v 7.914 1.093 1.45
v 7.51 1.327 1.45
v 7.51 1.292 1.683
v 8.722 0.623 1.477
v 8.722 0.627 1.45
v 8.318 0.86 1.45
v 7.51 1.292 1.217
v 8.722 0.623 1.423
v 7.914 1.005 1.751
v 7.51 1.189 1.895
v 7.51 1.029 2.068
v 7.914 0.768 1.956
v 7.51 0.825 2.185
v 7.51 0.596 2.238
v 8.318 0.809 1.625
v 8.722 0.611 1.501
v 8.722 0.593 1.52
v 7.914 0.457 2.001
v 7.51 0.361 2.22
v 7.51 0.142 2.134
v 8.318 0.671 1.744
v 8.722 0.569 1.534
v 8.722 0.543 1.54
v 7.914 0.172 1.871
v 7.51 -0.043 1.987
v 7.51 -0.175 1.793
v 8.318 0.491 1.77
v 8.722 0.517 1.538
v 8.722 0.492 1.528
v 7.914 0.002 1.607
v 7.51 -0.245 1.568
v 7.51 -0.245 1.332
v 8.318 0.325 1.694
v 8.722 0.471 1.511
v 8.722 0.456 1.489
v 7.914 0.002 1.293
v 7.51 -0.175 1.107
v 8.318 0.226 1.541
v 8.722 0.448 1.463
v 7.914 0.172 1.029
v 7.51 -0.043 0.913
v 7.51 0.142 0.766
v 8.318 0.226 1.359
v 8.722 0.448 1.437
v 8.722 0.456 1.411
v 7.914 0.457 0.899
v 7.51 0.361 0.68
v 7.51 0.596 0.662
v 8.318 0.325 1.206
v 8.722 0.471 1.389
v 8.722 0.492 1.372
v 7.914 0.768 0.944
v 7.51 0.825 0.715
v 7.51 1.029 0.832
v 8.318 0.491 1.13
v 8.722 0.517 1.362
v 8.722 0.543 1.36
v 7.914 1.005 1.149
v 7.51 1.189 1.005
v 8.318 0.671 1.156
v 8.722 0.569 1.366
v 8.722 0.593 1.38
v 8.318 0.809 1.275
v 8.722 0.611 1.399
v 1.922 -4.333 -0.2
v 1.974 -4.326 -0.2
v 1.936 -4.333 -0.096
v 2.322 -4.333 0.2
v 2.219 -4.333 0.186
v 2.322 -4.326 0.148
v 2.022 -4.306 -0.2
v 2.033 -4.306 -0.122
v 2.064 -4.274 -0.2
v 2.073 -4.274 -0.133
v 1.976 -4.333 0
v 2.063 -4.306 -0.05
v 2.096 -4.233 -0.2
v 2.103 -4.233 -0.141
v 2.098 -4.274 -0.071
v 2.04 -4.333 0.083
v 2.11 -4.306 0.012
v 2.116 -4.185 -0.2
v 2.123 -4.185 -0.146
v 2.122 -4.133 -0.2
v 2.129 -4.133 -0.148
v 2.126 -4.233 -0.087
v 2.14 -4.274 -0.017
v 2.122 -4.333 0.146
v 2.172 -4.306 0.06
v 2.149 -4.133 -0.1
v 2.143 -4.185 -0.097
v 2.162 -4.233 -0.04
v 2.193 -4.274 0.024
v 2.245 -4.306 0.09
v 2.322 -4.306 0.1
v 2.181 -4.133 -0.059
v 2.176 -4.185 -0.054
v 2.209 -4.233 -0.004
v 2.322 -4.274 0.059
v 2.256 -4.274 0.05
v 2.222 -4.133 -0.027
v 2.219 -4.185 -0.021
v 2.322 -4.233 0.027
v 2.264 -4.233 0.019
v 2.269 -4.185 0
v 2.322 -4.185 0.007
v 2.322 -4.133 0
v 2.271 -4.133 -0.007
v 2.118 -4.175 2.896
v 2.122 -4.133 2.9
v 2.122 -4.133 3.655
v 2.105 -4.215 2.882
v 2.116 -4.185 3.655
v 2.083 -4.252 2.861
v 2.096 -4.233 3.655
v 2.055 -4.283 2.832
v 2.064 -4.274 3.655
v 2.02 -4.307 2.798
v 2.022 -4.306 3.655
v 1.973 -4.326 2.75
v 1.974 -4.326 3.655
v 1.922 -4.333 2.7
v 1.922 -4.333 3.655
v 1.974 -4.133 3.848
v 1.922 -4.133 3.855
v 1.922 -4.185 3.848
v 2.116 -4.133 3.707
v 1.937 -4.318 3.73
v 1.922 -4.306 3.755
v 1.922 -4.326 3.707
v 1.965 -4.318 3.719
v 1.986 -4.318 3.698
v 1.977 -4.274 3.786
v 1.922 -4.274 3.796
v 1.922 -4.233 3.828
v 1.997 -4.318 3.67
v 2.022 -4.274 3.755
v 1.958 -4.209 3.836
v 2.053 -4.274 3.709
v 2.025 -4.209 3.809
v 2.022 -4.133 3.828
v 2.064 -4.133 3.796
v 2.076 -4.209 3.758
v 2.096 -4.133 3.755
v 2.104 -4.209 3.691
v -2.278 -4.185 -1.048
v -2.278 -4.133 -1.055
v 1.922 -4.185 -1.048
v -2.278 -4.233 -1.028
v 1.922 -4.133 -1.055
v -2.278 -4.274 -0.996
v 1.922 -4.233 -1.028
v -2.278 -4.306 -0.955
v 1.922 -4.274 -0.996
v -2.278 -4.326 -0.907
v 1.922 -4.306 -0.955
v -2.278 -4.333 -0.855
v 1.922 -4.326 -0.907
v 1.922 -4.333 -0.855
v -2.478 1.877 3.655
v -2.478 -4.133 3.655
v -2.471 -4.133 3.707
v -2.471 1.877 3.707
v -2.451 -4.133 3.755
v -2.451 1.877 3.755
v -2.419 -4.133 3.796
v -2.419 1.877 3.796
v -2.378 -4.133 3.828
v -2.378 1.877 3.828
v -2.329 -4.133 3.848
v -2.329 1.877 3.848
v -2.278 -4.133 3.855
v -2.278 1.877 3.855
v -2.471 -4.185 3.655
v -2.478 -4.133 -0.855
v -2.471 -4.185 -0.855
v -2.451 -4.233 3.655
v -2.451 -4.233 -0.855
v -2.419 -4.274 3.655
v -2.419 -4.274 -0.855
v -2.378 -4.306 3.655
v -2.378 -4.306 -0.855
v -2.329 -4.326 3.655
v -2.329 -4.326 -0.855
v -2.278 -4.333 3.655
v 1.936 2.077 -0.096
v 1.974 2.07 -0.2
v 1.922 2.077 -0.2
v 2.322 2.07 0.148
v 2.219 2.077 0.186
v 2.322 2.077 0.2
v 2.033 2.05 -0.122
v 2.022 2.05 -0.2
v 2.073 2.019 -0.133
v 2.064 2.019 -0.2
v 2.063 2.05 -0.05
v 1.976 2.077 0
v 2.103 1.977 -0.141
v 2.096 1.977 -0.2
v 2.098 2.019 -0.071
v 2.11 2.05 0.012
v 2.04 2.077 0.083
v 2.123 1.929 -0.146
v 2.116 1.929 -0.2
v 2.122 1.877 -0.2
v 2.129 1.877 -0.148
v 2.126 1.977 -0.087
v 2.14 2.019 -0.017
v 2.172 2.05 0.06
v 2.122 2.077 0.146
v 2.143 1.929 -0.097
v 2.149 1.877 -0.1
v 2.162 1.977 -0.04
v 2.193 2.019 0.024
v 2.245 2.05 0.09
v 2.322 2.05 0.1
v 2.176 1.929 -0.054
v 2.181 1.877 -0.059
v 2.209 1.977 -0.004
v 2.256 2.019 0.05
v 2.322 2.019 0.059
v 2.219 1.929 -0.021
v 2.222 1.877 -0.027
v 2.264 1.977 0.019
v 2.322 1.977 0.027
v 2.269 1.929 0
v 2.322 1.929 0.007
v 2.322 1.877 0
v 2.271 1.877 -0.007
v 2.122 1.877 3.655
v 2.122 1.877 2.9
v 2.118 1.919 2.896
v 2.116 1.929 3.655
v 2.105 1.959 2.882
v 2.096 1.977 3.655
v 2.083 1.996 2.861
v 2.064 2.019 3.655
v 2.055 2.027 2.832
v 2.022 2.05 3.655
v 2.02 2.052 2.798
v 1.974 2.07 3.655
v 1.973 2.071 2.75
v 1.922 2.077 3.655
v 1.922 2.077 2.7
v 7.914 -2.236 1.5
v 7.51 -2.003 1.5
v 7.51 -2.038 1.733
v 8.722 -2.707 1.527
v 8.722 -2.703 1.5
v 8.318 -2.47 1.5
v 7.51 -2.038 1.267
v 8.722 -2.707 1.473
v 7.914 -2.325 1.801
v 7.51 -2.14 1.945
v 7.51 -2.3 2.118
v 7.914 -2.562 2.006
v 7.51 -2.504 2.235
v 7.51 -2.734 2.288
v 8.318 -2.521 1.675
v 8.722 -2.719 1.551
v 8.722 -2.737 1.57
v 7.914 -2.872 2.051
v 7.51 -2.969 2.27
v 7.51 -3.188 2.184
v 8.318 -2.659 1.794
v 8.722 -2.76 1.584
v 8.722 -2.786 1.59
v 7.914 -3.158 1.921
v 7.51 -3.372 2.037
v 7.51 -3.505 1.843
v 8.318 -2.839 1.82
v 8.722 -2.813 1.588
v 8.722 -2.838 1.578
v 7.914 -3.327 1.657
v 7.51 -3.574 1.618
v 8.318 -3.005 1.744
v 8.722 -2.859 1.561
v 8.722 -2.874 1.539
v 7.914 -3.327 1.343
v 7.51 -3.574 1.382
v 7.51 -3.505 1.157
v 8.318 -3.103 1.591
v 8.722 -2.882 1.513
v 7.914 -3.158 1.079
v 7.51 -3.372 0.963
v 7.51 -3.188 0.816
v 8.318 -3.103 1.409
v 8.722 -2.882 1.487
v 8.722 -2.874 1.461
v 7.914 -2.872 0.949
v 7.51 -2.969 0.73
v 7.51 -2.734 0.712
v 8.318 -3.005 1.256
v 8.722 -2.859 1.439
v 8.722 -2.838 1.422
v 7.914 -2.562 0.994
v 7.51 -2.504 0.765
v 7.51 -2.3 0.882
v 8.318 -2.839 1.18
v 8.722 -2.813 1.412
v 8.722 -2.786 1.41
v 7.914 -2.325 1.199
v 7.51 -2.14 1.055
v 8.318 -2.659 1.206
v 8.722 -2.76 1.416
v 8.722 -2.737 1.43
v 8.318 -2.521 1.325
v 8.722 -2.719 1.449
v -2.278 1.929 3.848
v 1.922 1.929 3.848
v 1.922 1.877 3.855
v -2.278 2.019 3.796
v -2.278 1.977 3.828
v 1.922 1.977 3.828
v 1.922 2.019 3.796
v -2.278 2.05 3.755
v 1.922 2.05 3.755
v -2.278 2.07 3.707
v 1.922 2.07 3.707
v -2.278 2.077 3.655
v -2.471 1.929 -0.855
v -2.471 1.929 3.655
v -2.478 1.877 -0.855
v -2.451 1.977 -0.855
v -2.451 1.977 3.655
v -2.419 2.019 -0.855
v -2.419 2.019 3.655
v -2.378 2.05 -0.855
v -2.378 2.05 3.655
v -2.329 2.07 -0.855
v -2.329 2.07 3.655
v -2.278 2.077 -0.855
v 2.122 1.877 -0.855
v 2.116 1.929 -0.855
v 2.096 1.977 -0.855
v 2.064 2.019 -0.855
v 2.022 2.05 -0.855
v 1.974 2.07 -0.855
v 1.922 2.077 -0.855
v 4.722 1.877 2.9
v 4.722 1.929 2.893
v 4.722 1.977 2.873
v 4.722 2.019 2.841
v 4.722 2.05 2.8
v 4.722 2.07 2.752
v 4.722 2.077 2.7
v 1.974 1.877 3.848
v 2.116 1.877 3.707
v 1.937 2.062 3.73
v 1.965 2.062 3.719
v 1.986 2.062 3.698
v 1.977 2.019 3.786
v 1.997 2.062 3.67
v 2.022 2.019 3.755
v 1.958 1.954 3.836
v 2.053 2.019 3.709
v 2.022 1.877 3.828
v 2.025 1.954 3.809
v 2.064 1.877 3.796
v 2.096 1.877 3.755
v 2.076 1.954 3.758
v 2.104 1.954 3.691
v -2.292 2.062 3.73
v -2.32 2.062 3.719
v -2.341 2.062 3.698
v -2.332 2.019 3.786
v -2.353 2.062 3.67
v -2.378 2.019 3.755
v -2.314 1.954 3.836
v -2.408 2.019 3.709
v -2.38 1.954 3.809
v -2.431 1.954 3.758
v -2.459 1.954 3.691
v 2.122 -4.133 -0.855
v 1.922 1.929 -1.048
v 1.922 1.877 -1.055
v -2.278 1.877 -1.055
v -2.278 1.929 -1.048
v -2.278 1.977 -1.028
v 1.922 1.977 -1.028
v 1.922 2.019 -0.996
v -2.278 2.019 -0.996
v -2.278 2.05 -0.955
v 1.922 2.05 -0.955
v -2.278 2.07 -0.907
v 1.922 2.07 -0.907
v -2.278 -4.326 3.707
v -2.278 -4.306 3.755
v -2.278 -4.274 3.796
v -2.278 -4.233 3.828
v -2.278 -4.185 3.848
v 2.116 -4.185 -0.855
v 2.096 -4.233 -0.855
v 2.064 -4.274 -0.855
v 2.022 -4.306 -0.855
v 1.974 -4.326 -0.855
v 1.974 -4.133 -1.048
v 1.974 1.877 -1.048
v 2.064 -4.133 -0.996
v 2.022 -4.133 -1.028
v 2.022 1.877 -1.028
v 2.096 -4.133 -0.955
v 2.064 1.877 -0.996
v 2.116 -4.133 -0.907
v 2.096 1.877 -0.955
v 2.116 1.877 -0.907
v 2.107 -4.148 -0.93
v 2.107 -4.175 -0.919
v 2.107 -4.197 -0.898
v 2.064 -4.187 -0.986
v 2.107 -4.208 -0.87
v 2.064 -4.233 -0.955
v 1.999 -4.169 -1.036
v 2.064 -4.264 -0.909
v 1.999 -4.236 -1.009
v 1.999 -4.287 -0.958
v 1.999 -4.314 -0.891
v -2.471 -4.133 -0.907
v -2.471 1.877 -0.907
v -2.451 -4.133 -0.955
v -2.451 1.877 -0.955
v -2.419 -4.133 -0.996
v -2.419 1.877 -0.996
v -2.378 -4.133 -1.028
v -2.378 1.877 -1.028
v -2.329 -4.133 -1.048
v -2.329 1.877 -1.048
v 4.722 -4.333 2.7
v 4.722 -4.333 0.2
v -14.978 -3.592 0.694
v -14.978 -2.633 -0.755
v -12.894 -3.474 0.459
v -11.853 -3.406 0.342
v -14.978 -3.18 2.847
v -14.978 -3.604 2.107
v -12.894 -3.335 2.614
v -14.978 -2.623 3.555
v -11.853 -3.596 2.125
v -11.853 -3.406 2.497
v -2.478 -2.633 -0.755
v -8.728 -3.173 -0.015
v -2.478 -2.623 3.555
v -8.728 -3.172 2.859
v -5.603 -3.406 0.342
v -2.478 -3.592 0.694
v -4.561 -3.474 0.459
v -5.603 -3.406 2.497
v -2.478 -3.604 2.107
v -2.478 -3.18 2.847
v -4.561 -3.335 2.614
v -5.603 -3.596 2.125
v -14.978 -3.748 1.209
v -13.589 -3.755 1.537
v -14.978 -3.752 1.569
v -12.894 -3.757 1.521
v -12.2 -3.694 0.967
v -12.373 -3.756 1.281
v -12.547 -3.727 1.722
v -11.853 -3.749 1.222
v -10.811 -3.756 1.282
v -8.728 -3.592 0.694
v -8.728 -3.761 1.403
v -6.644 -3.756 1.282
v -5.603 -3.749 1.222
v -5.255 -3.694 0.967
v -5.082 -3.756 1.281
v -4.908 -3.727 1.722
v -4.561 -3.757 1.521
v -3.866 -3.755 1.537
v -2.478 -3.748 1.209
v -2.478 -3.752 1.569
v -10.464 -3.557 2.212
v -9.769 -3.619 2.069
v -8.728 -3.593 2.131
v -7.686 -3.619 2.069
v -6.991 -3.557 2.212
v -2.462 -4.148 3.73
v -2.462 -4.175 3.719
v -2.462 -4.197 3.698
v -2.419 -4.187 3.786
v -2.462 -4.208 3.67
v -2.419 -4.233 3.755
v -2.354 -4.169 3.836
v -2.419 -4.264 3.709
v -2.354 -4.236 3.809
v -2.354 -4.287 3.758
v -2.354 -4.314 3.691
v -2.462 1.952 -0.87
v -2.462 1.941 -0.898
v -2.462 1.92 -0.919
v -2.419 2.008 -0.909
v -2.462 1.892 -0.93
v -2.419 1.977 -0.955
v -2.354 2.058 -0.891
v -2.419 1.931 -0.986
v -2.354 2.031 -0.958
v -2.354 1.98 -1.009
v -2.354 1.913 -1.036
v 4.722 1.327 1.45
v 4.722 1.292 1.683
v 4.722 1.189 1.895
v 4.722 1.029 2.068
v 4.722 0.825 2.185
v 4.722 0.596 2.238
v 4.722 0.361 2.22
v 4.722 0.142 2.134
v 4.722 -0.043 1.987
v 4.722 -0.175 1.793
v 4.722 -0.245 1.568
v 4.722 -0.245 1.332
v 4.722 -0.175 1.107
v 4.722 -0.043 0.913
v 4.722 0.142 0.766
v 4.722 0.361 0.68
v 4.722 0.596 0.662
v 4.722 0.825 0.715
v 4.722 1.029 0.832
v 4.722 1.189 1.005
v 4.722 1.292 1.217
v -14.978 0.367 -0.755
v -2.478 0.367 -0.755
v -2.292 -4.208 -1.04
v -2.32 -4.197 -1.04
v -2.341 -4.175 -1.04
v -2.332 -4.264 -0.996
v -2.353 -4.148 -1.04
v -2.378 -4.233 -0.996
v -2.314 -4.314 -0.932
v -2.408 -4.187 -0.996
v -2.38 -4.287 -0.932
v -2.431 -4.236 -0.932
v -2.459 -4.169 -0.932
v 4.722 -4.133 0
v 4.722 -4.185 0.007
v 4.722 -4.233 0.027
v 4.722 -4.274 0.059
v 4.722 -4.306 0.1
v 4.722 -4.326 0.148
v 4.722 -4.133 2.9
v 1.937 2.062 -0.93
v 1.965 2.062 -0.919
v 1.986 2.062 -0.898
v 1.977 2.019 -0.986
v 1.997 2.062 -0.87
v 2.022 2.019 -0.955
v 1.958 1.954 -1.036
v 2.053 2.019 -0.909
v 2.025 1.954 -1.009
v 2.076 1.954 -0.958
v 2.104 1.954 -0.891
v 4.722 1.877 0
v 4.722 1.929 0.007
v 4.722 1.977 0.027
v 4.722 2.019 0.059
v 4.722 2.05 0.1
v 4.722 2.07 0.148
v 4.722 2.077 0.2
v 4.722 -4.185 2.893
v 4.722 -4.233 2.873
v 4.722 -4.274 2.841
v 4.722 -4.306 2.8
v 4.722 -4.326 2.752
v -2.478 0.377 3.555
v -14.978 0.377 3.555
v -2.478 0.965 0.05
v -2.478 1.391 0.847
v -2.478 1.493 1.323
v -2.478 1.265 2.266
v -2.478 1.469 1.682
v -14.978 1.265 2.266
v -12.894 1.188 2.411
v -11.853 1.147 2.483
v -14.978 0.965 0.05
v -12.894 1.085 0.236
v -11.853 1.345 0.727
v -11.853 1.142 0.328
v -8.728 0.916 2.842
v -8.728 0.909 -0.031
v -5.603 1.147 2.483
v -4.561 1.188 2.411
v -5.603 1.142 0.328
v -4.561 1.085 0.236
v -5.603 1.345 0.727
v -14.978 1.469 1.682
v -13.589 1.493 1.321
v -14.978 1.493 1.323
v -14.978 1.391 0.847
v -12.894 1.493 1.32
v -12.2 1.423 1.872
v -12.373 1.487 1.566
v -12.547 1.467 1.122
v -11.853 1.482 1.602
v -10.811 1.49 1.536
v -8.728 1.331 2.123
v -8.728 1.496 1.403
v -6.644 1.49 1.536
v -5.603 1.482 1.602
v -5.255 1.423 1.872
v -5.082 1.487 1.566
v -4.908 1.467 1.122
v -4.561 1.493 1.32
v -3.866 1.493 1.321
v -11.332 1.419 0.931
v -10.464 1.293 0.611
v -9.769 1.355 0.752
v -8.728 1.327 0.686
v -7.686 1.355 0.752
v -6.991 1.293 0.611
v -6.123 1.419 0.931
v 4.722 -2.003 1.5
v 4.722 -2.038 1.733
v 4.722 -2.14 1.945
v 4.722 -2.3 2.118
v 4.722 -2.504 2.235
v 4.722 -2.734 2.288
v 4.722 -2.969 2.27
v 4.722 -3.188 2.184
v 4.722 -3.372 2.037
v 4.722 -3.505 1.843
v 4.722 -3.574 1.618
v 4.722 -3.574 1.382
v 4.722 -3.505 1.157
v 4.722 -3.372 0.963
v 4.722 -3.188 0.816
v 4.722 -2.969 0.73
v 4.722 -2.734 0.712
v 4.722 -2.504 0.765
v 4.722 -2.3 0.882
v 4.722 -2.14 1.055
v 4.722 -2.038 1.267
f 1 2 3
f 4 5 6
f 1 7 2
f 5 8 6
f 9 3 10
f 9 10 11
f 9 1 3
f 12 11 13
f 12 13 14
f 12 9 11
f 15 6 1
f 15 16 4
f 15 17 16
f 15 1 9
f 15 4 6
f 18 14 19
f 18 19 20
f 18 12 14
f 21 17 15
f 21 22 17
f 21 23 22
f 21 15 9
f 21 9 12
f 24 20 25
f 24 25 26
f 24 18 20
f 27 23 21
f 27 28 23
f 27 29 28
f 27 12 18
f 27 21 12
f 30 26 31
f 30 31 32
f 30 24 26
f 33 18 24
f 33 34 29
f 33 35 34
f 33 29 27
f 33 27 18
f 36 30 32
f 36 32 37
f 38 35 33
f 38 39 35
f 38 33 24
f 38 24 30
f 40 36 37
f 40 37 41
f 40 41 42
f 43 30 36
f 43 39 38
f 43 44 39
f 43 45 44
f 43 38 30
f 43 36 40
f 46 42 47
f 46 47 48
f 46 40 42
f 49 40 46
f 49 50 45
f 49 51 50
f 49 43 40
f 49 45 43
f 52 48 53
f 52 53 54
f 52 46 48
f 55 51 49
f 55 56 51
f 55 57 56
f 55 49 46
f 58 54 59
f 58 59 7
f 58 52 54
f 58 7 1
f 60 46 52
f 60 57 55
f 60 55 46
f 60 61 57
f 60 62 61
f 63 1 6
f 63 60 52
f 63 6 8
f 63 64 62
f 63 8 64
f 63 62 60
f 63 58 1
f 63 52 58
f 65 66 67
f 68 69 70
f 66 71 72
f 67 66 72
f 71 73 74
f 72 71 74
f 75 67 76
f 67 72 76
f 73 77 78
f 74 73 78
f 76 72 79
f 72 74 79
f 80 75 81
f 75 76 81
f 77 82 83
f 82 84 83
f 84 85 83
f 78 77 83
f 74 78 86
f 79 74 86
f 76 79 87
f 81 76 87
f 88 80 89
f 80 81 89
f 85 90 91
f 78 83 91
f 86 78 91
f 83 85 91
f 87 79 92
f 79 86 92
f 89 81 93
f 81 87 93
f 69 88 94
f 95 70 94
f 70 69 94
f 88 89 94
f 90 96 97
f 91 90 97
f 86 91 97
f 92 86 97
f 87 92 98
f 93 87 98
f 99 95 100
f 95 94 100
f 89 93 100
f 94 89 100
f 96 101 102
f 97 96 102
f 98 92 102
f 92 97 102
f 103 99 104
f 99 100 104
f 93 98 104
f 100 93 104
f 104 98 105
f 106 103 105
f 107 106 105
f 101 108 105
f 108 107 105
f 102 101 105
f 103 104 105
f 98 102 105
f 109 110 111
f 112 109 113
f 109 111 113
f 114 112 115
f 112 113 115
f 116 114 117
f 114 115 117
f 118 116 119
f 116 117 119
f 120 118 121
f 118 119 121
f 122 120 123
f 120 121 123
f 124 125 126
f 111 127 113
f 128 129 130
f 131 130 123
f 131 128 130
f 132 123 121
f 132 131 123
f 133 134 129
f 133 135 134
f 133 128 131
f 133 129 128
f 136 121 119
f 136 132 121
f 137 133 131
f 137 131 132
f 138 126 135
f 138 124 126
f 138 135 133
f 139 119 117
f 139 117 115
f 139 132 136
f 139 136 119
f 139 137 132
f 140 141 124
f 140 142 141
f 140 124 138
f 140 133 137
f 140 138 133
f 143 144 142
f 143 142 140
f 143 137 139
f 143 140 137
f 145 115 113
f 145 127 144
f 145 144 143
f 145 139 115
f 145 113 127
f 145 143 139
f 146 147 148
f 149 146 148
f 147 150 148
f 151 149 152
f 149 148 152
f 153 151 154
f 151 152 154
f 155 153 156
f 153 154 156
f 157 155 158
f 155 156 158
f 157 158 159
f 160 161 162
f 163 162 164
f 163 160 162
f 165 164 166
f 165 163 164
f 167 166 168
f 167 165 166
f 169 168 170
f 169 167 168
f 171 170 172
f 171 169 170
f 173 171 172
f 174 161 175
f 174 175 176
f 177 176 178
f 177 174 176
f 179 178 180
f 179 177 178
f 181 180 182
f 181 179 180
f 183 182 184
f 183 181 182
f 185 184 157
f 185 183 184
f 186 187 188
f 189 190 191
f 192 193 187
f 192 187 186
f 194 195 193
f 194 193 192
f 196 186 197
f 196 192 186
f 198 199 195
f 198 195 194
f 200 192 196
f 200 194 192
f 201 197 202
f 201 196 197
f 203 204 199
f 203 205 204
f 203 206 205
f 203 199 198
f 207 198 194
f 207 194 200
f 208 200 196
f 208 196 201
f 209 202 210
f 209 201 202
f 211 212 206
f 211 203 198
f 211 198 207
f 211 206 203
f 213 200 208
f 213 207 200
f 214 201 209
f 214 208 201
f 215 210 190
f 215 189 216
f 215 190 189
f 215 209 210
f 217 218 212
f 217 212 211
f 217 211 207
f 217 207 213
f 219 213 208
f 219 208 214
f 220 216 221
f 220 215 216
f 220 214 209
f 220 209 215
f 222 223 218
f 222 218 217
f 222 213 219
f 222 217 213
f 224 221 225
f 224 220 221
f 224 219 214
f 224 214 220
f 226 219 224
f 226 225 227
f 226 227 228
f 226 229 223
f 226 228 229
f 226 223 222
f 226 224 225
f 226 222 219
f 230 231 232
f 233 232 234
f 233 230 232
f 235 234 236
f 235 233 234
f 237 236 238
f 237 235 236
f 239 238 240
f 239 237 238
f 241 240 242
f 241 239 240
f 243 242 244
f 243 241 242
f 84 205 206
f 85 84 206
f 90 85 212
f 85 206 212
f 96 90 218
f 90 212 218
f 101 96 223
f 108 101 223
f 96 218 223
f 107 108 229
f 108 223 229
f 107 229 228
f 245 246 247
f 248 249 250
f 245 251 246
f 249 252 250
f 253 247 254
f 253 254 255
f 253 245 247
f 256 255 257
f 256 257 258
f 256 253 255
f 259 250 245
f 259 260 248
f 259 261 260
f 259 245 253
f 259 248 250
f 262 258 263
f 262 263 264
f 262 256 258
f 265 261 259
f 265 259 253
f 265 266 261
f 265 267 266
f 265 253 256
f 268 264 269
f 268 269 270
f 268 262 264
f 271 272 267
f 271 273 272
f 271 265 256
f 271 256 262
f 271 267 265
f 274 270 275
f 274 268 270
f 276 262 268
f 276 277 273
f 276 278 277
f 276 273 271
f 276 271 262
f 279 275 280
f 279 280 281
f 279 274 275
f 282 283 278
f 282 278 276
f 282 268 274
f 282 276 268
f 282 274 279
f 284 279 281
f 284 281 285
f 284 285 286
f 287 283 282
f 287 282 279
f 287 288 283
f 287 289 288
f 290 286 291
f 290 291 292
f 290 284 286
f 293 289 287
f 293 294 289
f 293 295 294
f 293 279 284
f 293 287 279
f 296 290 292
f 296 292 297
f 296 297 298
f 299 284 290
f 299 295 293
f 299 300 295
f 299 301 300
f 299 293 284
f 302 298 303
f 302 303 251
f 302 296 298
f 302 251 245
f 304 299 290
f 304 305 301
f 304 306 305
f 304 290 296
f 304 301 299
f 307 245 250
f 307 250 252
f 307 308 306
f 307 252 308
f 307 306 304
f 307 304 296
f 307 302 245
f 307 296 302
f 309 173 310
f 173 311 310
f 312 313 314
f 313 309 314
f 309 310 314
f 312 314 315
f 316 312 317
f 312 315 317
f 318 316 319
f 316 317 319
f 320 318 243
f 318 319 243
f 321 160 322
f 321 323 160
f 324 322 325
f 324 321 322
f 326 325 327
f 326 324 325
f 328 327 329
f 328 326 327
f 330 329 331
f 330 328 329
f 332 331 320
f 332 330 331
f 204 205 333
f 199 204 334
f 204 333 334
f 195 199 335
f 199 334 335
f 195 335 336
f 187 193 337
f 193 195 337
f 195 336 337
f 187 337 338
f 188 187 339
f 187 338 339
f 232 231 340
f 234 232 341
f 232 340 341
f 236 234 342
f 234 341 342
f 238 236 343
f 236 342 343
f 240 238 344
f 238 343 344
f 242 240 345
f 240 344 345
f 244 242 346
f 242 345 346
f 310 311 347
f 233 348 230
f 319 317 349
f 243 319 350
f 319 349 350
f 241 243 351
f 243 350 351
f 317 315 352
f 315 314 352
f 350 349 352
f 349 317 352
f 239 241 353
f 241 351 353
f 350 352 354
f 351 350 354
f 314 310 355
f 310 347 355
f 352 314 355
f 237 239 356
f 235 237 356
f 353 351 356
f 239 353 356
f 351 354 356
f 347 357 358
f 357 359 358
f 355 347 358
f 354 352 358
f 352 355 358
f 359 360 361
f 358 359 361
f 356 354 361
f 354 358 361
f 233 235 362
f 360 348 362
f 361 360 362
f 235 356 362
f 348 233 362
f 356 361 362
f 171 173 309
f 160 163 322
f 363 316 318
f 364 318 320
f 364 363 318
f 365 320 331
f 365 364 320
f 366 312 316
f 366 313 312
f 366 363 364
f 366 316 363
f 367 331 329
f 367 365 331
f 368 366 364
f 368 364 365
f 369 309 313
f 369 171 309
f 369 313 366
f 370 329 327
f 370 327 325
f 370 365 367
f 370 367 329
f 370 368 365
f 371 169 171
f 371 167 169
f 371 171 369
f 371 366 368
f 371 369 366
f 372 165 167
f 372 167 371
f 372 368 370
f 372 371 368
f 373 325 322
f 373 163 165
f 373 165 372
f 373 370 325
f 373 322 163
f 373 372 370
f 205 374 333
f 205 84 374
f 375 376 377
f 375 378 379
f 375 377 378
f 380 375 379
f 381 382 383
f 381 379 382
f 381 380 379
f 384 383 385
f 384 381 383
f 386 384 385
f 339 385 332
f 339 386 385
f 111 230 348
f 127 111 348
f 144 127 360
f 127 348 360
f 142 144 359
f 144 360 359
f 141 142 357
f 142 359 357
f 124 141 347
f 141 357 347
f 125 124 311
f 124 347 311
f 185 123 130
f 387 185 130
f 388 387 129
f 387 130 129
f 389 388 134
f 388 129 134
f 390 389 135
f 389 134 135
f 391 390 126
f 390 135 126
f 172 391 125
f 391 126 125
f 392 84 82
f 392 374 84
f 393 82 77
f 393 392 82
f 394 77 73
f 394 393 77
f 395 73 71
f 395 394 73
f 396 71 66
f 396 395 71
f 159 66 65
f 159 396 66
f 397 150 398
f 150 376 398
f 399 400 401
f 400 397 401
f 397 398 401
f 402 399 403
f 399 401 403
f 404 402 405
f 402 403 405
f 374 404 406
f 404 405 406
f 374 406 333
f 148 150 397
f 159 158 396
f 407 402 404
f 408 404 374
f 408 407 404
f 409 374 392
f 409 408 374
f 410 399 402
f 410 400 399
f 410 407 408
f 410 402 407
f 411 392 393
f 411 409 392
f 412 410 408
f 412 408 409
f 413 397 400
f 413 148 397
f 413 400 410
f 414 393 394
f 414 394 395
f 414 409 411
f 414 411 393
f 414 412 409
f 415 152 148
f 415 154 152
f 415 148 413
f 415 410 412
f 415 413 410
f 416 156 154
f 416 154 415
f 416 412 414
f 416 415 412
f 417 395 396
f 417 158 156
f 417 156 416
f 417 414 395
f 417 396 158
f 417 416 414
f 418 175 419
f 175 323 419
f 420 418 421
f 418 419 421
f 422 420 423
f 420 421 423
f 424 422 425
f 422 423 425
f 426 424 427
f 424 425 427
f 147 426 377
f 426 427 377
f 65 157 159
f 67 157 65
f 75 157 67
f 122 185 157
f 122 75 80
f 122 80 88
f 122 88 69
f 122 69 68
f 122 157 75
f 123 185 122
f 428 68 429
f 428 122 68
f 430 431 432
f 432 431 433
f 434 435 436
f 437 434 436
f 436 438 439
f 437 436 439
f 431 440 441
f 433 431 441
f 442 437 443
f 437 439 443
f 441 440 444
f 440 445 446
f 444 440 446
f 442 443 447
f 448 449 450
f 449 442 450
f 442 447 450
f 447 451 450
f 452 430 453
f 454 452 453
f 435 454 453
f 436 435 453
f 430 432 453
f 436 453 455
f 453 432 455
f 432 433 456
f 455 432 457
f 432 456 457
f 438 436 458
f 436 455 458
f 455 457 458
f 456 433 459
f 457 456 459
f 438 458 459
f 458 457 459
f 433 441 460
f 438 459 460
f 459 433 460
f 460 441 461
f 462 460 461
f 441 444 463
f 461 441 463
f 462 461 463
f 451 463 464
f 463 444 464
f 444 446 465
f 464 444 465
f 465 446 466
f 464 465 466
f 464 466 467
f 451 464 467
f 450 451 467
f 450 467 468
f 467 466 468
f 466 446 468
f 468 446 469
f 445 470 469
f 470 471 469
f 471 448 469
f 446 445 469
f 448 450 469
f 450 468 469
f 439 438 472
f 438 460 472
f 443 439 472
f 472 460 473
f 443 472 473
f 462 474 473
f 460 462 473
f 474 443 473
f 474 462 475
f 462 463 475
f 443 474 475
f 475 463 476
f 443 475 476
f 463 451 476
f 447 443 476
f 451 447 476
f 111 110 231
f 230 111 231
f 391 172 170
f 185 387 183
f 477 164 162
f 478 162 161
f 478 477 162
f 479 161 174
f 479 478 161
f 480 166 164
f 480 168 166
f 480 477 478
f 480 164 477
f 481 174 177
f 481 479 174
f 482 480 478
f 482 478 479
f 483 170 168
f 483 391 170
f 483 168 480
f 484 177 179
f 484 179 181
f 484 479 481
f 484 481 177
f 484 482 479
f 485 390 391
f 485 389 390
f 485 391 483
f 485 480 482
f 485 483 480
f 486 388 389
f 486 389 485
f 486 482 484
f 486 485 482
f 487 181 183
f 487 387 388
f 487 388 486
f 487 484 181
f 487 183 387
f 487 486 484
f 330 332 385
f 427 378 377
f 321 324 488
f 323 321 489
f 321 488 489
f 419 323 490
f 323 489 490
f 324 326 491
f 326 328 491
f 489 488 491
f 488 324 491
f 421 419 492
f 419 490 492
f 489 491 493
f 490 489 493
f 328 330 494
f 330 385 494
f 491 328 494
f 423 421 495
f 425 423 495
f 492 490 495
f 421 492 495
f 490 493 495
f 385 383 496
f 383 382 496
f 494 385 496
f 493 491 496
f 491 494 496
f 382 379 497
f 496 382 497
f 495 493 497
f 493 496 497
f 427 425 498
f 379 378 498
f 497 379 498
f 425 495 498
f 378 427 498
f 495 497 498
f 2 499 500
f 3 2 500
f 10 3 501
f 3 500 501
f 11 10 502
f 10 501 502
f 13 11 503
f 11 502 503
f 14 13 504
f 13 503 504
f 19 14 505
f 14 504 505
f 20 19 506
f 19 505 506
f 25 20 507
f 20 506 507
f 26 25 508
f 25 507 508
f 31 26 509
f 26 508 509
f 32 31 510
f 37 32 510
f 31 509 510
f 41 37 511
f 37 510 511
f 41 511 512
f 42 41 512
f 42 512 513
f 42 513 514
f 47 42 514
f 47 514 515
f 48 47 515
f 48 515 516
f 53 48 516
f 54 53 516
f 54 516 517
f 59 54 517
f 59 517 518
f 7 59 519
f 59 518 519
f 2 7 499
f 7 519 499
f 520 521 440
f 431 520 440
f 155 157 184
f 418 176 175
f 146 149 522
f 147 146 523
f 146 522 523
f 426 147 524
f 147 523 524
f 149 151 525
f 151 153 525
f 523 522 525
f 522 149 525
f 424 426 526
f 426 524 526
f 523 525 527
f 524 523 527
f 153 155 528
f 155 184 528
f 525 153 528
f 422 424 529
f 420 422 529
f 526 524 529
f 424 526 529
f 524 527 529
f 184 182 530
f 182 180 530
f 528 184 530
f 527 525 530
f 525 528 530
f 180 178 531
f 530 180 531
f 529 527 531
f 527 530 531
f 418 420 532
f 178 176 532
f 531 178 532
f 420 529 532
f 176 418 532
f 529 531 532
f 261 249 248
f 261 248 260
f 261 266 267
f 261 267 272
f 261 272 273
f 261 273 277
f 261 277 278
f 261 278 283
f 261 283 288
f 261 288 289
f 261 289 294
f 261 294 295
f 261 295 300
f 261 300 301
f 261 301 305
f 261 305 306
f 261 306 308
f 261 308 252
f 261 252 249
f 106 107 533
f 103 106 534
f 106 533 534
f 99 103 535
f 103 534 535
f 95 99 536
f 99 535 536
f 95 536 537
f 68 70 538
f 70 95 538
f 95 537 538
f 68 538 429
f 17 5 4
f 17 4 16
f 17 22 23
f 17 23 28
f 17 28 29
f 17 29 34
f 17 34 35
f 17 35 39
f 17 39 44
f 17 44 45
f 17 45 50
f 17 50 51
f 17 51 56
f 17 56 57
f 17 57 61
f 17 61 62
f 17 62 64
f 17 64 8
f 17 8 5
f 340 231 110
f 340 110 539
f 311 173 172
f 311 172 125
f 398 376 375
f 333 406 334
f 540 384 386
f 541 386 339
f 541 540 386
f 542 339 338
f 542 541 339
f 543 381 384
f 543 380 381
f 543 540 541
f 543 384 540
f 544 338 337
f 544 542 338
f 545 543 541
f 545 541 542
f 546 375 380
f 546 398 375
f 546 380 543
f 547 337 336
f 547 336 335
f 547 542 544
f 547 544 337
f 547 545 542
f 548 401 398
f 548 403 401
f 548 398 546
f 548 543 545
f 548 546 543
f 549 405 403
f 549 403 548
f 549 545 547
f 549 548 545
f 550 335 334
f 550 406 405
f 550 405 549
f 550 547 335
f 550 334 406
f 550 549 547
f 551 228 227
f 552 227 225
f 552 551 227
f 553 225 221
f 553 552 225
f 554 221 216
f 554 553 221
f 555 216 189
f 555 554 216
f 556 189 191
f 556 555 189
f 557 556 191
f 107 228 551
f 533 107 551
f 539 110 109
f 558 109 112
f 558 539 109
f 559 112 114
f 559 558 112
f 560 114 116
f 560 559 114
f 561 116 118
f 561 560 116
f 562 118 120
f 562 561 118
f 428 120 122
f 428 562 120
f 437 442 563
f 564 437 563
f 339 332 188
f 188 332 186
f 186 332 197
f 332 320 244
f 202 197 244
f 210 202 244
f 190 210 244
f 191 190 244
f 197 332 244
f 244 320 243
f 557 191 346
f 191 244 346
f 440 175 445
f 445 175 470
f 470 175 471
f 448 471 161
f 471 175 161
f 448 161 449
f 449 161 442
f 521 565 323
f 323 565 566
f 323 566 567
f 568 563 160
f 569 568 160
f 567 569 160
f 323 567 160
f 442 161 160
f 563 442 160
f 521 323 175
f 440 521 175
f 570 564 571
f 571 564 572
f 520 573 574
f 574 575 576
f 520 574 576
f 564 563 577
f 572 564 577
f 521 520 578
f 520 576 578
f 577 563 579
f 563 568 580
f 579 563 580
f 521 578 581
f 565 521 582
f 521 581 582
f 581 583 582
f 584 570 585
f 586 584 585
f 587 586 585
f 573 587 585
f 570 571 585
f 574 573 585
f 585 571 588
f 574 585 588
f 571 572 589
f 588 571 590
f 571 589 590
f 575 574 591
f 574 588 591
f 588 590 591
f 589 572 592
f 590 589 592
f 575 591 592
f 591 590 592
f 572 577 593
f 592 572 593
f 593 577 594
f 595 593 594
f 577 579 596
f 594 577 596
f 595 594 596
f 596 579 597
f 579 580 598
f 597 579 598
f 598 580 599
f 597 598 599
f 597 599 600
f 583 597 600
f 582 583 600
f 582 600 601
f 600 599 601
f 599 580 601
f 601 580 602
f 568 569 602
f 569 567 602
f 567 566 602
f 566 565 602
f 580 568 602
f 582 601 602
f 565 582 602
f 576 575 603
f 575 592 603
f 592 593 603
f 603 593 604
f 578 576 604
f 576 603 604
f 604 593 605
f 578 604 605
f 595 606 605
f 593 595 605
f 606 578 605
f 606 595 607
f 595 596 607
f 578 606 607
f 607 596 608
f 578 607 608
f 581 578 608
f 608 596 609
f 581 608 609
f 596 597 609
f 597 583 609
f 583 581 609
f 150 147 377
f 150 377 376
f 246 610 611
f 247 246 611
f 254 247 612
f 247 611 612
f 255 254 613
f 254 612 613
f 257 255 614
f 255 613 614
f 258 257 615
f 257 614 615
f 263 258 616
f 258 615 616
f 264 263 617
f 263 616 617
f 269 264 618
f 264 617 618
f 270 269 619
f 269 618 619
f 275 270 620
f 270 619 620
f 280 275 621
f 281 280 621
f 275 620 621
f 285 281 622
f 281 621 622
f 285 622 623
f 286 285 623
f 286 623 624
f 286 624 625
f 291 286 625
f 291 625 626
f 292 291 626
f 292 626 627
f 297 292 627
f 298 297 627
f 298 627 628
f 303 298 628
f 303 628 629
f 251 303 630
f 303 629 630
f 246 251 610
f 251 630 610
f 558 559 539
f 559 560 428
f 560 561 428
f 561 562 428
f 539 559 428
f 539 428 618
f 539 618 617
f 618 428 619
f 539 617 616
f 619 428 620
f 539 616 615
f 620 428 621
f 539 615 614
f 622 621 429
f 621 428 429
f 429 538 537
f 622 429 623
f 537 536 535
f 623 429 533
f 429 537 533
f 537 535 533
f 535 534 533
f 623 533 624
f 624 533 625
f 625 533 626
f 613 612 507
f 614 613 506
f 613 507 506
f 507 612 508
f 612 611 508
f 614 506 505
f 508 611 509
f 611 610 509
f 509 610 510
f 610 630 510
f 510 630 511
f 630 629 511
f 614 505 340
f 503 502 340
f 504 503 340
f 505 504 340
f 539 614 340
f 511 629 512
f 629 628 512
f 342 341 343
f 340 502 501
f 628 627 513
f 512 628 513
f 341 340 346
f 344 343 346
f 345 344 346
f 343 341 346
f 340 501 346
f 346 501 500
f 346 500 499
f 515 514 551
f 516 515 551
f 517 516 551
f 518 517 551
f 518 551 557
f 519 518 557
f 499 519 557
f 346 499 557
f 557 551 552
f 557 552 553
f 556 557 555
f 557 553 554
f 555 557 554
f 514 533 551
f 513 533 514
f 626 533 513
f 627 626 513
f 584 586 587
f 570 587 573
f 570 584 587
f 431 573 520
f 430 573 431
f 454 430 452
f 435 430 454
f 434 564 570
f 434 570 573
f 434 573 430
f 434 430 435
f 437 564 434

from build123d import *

# Parameters (mm, degrees)
F1_W       = 7.2
F1_H       = 6.41
F2_DEPTH   = 2.9
F3_W       = 4.6
F3_H       = 6.41
F4_DEPTH   = 0.955
F5_DEPTH   = 3.955
F6_R       = 0.2
F7_R       = 0.79
F8_DEPTH   = 4
F9_SIZE2   = 0.7
F9_SIZE    = 1.2124355653
F9_2_SIZE2 = 0.7
F9_2_SIZE  = 1.2124355653
F11_DEPTH  = 12.5


# Not quite as in the source:
# - a feature names something its author has since deleted; it is built from what else it names


with BuildPart() as f2:
    # F1 (on face) → F2 (new body)
    with BuildSketch(Plane.XY):
        with Locations((1.1224337457, -1.1278976017)):
            Rectangle(F1_W, F1_H)
    extrude(amount=F2_DEPTH)

    # F3 (on face) → F4 (join)
    with BuildSketch(Plane.XY.offset(2.9)):
        with Locations((-0.1775662543, -1.1278976017)):
            Rectangle(F3_W, F3_H)
    extrude(amount=F4_DEPTH)

    # F3 (on face) → F5 (join)
    with BuildSketch(Plane.XY.offset(2.9)):
        with Locations((-0.1775662543, -1.1278976017)):
            Rectangle(F3_W, F3_H)
    extrude(amount=-F5_DEPTH)

    # F6
    f6_edges = [f2.edges().sort_by_distance(p)[0] for p in [
        (2.122434, -1.127898, 3.855),
        (-0.177566, -4.332898, 3.855),
        (-2.477566, -1.127898, 3.855),
        (-0.177566, 2.077102, 3.855),
        (3.422434, -4.332898, 2.9),
        (2.122434, -4.332898, 3.3775),
        (-2.477566, -4.332898, 1.4),
        (-0.177566, -4.332898, -1.055),
        (2.122434, -1.127898, -1.055),
        (-0.177566, 2.077102, -1.055),
        (2.122434, -4.332898, -0.5275),
        (3.422434, -4.332898, 0),
        (2.122434, 2.077102, -0.5275),
        (3.422434, 2.077102, 2.9),
        (2.122434, 2.077102, 3.3775),
        (3.422434, 2.077102, 0),
        (-2.477566, 2.077102, 1.4),
        (-2.477566, -1.127898, -1.055),
        (2.122434, -1.127898, 0),
    ]]
    fillet(f6_edges, radius=F6_R)

    # F7 (on face) → F8 (join)
    with BuildSketch(Plane.YZ.offset(4.7224337457)):
        with Locations((-2.7930222052, 1.5)):
            Circle(F7_R)
        with Locations((0.5366023983, 1.45)):
            Circle(F7_R)
    extrude(amount=F8_DEPTH)

    # F9
    f9_edges = [f2.edges().sort_by_distance(p)[0] for p in [
        (8.722434, -3.583022, 1.5),
    ]]
    f9_side = f2.faces().sort_by_distance((6.722434, -3.583022, 1.5))[0]
    chamfer(f9_edges, length=F9_SIZE, length2=F9_SIZE2, reference=f9_side)

    # F9#2
    f9_2_edges = [f2.edges().sort_by_distance(p)[0] for p in [
        (8.722434, -0.253398, 1.45),
    ]]
    f9_2_side = f2.faces().sort_by_distance((6.722434, -0.253398, 1.45))[0]
    chamfer(f9_2_edges, length=F9_2_SIZE, length2=F9_2_SIZE2, reference=f9_2_side)

    # F10 (on face) → F11 (join)
    with BuildSketch(Plane(origin=(-2.4775662543, 0, 0), x_dir=(0, -1, 0), z_dir=(-1, 0, 0))):
        with BuildLine():
            Line((2.6228976017, 3.555), (-0.3771023983, 3.555))
            add(Edge.make_bspline(
                [(-0.3771023983, 3.555), (-0.9371962785, 2.8481079618), (-2.0580811679, 1.3923591855), (-0.9290927555, -0.0252525917), (-0.3671023983, -0.755)],
                knots=[0, 0, 0, 0, 0.4994437063, 1, 1, 1, 1], degree=3))
            Line((-0.3671023983, -0.755), (2.6328976017, -0.755))
            add(Edge.make_bspline(
                [(2.6328976017, -0.755), (3.1901916784, 0.0098145578), (4.3309296415, 1.3596346202), (3.1935954585, 2.8839832867), (2.6228976017, 3.555)],
                knots=[0, 0, 0, 0, 0.5000783208, 1, 1, 1, 1], degree=3))
        make_face()
    extrude(amount=F11_DEPTH)


solid = f2.part
